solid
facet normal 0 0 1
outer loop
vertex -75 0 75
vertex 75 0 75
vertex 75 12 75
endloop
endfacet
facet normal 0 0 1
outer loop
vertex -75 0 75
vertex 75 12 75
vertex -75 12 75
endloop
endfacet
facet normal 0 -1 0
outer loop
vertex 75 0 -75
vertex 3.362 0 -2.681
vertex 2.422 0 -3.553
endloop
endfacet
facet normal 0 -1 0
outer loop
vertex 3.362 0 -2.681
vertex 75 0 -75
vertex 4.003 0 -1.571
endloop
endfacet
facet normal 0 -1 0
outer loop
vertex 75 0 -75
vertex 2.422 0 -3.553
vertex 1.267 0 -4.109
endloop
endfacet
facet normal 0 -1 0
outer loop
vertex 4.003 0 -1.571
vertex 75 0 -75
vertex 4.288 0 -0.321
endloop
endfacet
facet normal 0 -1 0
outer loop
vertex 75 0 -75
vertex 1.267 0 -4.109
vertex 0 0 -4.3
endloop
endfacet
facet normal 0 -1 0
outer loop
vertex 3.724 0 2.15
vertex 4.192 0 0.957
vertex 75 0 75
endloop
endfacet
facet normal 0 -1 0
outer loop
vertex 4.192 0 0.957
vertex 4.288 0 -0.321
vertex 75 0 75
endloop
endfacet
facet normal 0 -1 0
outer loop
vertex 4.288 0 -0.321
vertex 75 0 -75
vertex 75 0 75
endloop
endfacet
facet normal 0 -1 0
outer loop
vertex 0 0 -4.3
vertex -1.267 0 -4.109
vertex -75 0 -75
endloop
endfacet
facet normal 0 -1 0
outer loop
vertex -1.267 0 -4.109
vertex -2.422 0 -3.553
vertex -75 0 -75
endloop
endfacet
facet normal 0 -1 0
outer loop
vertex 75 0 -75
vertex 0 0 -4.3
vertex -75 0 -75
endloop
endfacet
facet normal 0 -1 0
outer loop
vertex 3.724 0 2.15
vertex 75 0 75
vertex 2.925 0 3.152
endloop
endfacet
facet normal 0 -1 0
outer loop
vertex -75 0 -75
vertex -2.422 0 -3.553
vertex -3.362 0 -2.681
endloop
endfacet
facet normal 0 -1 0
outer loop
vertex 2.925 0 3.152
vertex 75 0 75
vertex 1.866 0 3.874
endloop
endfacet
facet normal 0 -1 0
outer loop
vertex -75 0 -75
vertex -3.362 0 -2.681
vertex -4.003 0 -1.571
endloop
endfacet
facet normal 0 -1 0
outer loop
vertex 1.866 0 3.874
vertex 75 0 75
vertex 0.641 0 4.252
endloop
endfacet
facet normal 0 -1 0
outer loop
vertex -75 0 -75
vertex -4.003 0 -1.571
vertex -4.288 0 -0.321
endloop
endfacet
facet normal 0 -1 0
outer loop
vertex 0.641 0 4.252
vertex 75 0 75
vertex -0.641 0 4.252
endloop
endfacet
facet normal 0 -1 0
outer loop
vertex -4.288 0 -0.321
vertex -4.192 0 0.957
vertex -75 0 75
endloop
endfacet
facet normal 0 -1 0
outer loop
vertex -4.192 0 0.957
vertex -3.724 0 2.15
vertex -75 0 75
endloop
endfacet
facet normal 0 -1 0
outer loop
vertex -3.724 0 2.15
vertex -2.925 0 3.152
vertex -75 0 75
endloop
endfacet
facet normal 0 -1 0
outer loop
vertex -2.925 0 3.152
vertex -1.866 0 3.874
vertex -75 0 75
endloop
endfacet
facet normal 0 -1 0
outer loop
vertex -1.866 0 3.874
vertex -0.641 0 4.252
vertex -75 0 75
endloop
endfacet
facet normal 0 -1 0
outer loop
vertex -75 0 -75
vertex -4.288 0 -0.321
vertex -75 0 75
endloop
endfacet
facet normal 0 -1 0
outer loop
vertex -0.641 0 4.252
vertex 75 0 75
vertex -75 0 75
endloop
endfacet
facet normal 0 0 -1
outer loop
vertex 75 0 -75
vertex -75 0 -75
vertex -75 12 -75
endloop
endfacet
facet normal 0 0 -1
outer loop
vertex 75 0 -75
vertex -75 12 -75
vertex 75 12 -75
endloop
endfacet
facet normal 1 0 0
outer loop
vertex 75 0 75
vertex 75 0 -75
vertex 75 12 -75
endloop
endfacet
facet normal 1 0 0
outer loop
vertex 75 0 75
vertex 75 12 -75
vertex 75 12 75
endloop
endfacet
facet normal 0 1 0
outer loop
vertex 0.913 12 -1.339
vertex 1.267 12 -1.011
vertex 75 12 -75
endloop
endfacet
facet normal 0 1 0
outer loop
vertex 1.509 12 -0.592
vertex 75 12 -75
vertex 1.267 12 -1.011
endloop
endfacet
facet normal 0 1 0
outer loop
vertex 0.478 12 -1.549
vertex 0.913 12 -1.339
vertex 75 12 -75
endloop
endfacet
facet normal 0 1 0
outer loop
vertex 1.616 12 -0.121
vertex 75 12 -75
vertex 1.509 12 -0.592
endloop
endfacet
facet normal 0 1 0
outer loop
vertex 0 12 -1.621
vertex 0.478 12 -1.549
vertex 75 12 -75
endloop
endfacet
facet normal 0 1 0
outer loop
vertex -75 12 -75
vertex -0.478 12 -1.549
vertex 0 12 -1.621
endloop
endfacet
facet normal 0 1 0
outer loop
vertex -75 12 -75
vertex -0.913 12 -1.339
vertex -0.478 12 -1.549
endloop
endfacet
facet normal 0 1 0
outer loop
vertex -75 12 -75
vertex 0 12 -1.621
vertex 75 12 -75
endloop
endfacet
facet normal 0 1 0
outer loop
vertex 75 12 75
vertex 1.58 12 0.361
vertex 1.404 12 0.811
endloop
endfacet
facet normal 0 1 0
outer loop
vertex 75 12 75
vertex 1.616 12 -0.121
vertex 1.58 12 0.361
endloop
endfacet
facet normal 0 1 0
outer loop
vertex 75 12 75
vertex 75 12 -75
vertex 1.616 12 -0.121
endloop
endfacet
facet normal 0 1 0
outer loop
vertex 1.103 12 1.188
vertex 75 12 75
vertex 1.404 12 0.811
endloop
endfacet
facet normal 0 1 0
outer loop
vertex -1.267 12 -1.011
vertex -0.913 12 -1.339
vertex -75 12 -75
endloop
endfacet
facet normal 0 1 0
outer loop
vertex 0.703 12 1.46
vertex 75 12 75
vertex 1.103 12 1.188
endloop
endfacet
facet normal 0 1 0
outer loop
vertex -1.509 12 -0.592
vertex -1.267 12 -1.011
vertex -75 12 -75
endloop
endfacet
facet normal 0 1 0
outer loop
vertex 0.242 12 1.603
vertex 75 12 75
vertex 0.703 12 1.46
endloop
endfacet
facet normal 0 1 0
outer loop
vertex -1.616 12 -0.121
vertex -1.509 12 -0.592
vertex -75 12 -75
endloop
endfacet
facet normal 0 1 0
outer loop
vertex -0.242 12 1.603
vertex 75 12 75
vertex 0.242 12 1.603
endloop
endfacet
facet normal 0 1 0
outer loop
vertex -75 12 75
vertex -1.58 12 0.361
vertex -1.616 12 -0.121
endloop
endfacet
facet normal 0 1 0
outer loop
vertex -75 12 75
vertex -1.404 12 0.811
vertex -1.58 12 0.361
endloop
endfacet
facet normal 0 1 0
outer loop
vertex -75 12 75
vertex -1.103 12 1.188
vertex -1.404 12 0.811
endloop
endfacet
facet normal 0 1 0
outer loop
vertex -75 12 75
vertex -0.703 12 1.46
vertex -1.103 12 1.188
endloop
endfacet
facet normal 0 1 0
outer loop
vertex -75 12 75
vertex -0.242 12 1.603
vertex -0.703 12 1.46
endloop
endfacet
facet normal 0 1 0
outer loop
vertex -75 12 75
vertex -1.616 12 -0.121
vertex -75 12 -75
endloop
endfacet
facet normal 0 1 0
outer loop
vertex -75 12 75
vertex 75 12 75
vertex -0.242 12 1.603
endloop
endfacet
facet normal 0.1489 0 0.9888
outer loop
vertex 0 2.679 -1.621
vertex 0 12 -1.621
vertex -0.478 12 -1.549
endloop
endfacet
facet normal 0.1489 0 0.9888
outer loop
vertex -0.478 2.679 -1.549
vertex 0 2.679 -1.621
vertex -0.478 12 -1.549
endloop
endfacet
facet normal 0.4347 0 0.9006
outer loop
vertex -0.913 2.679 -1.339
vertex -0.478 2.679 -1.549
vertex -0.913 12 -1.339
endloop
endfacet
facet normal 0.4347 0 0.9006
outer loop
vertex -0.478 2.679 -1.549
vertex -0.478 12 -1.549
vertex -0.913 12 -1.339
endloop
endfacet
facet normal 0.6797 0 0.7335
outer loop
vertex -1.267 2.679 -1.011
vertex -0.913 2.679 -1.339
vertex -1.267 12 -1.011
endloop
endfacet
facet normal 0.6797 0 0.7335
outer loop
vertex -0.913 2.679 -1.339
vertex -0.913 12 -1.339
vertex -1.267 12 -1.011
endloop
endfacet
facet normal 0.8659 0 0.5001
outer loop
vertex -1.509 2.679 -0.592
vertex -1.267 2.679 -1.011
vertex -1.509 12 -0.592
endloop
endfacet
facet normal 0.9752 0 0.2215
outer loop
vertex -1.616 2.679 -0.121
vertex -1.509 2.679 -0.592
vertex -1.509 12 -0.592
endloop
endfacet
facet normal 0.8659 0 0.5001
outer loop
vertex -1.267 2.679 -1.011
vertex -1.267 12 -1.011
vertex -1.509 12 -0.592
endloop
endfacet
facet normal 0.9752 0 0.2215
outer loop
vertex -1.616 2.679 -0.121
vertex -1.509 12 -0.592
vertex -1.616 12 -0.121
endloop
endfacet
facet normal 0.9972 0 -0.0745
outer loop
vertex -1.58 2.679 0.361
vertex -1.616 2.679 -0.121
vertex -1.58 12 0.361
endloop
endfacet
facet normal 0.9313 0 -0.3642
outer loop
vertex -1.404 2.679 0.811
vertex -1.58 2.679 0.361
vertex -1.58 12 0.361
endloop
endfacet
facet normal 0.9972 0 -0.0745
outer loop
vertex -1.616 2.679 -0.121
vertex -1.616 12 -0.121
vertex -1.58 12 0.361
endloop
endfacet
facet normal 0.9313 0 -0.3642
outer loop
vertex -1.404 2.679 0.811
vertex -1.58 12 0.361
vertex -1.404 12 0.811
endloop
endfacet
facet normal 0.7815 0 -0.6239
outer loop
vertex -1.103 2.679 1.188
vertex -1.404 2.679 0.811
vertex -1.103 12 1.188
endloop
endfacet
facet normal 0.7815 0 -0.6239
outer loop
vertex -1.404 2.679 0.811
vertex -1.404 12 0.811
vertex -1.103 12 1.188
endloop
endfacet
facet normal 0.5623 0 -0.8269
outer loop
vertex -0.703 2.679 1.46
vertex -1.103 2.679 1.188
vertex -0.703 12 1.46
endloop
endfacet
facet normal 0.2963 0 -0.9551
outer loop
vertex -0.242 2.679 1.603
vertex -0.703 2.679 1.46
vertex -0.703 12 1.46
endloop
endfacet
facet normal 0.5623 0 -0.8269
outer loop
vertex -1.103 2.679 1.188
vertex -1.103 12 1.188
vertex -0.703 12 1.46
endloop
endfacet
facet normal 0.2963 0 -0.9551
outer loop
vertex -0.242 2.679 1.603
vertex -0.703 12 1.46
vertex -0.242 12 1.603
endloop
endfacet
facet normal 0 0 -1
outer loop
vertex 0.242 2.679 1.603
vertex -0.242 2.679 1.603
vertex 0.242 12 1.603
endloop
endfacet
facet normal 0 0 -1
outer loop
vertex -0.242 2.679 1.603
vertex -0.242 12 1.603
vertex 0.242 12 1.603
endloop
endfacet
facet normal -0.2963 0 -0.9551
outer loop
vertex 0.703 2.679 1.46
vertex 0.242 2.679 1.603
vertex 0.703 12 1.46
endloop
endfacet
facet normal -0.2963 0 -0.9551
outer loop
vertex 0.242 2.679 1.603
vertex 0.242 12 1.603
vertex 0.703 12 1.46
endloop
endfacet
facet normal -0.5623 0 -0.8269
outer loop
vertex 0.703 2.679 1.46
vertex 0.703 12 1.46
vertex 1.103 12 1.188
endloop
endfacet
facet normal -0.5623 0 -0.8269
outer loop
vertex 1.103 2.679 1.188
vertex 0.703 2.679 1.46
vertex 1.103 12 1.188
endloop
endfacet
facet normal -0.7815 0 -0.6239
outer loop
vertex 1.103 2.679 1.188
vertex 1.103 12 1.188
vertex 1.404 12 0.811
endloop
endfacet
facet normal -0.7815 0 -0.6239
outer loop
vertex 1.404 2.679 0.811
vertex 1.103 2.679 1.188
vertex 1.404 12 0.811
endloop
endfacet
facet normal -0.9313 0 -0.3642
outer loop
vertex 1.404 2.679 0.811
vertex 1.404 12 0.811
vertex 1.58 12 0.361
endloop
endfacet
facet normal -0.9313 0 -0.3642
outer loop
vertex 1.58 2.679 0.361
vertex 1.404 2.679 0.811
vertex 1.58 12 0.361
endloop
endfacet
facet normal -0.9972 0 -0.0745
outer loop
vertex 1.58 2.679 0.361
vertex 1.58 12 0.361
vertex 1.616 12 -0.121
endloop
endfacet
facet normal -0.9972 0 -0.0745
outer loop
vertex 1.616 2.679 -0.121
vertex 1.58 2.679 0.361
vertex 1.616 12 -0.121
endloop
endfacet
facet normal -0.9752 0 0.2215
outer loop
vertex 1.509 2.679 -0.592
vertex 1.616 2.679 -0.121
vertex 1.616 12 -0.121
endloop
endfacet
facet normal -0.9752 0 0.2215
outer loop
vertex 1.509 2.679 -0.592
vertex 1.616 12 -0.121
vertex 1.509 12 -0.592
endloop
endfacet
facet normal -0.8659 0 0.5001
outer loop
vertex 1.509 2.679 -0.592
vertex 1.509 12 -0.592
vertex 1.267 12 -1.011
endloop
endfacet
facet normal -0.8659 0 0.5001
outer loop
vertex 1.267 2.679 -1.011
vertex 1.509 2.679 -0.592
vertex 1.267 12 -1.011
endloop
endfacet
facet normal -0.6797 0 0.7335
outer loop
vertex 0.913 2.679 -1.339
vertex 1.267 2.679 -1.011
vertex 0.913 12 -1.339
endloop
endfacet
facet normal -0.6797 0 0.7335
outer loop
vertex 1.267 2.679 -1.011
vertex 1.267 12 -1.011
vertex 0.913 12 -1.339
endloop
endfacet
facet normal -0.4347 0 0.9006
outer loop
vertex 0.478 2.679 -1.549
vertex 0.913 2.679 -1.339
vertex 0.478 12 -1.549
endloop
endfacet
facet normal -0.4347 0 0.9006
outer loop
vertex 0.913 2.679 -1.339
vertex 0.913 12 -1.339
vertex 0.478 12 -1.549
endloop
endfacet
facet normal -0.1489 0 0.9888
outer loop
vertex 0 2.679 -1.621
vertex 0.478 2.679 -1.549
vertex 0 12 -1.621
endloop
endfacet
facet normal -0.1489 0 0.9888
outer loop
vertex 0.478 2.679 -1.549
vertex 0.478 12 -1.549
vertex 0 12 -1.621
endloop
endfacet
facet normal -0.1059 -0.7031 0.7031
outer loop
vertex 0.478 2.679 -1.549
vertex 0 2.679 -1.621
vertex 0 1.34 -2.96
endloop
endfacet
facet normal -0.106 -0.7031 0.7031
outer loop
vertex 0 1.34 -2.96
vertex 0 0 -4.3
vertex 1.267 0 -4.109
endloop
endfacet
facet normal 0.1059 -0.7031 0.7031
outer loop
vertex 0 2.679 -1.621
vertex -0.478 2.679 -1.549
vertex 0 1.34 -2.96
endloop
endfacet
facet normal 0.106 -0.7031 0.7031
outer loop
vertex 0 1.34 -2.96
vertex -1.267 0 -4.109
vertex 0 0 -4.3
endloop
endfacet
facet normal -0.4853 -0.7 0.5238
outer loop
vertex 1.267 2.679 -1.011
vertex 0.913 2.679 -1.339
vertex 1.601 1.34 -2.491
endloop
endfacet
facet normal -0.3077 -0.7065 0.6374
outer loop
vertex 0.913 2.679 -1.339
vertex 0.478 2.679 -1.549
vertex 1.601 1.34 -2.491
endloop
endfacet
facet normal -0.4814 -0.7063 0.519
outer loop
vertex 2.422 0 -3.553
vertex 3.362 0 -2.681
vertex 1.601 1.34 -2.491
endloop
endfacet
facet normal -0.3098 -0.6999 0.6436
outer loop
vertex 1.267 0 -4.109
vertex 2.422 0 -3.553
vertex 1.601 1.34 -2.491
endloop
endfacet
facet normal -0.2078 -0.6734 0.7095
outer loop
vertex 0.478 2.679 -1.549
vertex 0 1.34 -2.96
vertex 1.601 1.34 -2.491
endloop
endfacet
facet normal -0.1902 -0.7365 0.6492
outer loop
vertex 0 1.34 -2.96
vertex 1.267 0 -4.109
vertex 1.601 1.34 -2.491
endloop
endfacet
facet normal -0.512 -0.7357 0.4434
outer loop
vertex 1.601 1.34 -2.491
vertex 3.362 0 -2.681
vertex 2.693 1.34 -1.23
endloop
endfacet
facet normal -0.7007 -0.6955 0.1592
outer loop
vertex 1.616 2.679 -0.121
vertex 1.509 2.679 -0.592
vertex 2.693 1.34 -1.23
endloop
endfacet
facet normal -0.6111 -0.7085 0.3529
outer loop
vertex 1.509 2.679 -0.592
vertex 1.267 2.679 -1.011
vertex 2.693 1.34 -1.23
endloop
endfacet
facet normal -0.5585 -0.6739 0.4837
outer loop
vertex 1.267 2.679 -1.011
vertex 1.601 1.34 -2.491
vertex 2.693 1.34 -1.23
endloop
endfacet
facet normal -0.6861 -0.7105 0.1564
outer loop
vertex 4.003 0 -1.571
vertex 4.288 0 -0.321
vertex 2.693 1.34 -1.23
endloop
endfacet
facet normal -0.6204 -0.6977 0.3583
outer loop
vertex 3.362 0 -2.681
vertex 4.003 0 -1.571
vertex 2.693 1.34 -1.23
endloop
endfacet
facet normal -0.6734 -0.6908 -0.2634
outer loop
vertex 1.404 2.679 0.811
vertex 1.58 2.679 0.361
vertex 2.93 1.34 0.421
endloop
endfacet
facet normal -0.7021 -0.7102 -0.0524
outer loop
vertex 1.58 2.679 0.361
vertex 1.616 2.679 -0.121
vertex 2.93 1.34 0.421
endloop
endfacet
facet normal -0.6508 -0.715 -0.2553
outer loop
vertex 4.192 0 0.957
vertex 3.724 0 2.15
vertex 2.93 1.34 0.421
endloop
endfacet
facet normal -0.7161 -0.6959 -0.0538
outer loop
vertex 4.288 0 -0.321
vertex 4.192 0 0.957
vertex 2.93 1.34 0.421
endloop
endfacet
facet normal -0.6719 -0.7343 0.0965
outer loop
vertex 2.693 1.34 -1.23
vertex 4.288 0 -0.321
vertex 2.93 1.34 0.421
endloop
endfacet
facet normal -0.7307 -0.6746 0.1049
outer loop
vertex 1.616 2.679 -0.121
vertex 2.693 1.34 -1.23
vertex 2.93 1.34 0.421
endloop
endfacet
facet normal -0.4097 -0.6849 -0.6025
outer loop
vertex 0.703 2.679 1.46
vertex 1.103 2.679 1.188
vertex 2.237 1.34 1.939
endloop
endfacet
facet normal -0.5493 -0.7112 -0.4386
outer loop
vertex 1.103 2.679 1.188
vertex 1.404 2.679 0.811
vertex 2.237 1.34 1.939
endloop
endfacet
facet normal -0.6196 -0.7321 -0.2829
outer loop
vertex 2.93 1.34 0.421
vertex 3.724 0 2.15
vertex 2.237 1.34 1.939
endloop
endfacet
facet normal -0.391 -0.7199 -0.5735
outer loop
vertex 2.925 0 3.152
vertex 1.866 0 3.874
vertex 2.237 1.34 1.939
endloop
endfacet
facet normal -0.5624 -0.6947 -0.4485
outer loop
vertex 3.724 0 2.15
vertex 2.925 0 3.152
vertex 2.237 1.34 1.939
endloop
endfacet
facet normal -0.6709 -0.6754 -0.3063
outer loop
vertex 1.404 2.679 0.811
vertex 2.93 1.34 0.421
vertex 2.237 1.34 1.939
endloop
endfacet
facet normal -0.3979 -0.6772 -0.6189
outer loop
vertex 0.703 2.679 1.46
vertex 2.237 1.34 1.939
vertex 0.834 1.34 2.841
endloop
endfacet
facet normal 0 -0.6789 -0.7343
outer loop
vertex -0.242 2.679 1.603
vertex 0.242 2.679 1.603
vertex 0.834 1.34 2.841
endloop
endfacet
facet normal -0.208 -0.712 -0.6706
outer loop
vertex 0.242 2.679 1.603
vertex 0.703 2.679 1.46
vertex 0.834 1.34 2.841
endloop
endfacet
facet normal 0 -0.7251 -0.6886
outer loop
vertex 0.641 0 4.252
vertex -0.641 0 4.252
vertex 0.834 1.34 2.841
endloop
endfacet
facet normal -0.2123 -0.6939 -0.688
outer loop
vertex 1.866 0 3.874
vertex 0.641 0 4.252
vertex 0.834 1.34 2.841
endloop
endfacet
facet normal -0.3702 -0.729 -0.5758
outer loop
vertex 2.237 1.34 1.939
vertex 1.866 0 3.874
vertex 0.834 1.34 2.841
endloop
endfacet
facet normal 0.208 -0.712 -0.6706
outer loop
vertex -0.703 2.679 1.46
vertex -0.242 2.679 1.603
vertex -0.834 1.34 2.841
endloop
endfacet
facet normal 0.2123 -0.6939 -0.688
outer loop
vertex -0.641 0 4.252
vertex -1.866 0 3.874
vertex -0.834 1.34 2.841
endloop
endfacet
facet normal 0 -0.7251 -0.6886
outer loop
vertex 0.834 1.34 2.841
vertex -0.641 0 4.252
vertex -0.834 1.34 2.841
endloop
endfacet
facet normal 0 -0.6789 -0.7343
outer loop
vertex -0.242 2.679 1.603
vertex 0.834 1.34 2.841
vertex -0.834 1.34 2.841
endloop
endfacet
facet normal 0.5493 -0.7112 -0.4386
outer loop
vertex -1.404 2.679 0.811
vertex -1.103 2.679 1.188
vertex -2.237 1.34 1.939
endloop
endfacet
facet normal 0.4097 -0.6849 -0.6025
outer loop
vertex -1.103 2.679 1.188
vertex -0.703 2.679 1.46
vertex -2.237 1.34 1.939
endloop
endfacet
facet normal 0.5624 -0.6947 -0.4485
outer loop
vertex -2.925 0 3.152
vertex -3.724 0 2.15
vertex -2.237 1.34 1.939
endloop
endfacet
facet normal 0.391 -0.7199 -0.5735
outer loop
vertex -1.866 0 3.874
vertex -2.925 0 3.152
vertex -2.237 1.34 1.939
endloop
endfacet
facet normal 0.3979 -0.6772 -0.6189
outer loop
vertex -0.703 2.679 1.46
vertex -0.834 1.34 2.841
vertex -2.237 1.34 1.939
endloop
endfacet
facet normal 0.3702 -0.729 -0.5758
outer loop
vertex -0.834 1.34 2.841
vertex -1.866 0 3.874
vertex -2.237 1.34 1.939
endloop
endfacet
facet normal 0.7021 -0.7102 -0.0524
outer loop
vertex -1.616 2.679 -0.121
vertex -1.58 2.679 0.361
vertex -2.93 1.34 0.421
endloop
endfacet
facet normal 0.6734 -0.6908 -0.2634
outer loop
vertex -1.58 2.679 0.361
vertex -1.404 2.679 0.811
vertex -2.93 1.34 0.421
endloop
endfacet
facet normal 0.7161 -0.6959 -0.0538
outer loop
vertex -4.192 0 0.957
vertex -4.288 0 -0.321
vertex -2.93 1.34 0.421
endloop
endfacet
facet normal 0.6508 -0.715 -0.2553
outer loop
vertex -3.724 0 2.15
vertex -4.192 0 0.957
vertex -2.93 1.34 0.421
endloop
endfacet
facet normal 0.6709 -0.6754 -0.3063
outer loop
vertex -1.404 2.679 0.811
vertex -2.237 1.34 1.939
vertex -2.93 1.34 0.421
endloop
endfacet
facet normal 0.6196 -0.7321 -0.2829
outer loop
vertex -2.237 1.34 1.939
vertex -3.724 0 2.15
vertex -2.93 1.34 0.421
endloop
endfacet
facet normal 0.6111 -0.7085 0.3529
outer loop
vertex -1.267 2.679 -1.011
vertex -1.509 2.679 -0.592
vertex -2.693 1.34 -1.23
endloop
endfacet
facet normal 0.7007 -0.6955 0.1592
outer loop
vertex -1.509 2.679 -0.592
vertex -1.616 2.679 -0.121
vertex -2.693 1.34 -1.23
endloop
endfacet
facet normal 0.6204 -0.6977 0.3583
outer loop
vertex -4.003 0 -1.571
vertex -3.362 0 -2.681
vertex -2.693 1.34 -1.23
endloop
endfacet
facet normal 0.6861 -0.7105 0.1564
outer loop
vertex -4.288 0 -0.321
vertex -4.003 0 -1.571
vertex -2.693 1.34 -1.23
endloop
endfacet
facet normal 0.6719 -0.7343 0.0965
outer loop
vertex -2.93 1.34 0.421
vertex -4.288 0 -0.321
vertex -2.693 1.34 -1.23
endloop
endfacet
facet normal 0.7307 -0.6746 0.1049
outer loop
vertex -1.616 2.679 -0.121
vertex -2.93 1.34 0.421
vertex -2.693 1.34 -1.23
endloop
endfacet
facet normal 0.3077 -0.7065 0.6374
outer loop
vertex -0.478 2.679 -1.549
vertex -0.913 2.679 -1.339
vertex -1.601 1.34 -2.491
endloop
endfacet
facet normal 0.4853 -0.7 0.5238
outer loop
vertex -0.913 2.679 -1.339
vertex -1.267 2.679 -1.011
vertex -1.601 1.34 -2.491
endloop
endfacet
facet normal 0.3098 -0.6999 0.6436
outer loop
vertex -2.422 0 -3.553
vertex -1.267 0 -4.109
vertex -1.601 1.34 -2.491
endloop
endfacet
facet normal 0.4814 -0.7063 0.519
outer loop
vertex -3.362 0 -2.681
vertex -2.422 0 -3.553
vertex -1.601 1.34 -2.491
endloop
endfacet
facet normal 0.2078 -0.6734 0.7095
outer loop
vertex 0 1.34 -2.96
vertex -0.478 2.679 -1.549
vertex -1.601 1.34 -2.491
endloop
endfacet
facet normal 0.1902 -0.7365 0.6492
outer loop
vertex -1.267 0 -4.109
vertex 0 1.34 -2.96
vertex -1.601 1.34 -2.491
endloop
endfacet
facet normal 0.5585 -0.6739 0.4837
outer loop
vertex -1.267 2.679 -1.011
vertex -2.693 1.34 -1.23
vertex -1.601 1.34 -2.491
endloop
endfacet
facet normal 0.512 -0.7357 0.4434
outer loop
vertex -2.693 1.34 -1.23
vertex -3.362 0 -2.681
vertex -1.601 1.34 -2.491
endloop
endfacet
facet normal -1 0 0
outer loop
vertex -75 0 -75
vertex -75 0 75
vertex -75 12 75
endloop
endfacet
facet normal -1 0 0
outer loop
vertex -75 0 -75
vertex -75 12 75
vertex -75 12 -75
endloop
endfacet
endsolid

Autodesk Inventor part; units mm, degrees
ref_plane "YZ Plane" through (0, 0, 0) normal (1, 0, 0) x (0, 1, 0)
ref_plane "XZ Plane" through (0, 0, 0) normal (0, 1, 0) x (-1, 0, 0)
ref_plane "XY Plane" through (0, 0, 0) normal (0, 0, 1) x (1, 0, 0)
sketch "Sketch1" plane through (0, 0, 0) normal (0, 1, 0) x (-1, 0, 0)
  line L0 (75, -75) -> (-75, -75)
  line L1 (-75, -75) -> (-75, 75)
  line L2 (-75, 75) -> (75, 75)
  line L3 (75, 75) -> (75, -75)
  point P0 (0, 0)
  point P1 (75, 0)
  point P2 (0, -75)
  dimension "d0" = 150
  dimension "d1" = 150
extrude "Extrusion1" add sketch "Sketch1" along normal blind 12
sketch "Sketch2" plane through (0, 0, 0) normal (0, -1, 0) x (1, 0, 0)
  point P0 (0, 0)
  point P1 (0, 0)
hole "Hole1" at (0, 0, 0) direction (0, 1, 0) diameter 3.242 end through all countersink diameter 8.6 countersink angle 90 thread size "M4x0.7" class "6H" standard "ISO Metric profile"
properties part number "Camera_base_plate"
